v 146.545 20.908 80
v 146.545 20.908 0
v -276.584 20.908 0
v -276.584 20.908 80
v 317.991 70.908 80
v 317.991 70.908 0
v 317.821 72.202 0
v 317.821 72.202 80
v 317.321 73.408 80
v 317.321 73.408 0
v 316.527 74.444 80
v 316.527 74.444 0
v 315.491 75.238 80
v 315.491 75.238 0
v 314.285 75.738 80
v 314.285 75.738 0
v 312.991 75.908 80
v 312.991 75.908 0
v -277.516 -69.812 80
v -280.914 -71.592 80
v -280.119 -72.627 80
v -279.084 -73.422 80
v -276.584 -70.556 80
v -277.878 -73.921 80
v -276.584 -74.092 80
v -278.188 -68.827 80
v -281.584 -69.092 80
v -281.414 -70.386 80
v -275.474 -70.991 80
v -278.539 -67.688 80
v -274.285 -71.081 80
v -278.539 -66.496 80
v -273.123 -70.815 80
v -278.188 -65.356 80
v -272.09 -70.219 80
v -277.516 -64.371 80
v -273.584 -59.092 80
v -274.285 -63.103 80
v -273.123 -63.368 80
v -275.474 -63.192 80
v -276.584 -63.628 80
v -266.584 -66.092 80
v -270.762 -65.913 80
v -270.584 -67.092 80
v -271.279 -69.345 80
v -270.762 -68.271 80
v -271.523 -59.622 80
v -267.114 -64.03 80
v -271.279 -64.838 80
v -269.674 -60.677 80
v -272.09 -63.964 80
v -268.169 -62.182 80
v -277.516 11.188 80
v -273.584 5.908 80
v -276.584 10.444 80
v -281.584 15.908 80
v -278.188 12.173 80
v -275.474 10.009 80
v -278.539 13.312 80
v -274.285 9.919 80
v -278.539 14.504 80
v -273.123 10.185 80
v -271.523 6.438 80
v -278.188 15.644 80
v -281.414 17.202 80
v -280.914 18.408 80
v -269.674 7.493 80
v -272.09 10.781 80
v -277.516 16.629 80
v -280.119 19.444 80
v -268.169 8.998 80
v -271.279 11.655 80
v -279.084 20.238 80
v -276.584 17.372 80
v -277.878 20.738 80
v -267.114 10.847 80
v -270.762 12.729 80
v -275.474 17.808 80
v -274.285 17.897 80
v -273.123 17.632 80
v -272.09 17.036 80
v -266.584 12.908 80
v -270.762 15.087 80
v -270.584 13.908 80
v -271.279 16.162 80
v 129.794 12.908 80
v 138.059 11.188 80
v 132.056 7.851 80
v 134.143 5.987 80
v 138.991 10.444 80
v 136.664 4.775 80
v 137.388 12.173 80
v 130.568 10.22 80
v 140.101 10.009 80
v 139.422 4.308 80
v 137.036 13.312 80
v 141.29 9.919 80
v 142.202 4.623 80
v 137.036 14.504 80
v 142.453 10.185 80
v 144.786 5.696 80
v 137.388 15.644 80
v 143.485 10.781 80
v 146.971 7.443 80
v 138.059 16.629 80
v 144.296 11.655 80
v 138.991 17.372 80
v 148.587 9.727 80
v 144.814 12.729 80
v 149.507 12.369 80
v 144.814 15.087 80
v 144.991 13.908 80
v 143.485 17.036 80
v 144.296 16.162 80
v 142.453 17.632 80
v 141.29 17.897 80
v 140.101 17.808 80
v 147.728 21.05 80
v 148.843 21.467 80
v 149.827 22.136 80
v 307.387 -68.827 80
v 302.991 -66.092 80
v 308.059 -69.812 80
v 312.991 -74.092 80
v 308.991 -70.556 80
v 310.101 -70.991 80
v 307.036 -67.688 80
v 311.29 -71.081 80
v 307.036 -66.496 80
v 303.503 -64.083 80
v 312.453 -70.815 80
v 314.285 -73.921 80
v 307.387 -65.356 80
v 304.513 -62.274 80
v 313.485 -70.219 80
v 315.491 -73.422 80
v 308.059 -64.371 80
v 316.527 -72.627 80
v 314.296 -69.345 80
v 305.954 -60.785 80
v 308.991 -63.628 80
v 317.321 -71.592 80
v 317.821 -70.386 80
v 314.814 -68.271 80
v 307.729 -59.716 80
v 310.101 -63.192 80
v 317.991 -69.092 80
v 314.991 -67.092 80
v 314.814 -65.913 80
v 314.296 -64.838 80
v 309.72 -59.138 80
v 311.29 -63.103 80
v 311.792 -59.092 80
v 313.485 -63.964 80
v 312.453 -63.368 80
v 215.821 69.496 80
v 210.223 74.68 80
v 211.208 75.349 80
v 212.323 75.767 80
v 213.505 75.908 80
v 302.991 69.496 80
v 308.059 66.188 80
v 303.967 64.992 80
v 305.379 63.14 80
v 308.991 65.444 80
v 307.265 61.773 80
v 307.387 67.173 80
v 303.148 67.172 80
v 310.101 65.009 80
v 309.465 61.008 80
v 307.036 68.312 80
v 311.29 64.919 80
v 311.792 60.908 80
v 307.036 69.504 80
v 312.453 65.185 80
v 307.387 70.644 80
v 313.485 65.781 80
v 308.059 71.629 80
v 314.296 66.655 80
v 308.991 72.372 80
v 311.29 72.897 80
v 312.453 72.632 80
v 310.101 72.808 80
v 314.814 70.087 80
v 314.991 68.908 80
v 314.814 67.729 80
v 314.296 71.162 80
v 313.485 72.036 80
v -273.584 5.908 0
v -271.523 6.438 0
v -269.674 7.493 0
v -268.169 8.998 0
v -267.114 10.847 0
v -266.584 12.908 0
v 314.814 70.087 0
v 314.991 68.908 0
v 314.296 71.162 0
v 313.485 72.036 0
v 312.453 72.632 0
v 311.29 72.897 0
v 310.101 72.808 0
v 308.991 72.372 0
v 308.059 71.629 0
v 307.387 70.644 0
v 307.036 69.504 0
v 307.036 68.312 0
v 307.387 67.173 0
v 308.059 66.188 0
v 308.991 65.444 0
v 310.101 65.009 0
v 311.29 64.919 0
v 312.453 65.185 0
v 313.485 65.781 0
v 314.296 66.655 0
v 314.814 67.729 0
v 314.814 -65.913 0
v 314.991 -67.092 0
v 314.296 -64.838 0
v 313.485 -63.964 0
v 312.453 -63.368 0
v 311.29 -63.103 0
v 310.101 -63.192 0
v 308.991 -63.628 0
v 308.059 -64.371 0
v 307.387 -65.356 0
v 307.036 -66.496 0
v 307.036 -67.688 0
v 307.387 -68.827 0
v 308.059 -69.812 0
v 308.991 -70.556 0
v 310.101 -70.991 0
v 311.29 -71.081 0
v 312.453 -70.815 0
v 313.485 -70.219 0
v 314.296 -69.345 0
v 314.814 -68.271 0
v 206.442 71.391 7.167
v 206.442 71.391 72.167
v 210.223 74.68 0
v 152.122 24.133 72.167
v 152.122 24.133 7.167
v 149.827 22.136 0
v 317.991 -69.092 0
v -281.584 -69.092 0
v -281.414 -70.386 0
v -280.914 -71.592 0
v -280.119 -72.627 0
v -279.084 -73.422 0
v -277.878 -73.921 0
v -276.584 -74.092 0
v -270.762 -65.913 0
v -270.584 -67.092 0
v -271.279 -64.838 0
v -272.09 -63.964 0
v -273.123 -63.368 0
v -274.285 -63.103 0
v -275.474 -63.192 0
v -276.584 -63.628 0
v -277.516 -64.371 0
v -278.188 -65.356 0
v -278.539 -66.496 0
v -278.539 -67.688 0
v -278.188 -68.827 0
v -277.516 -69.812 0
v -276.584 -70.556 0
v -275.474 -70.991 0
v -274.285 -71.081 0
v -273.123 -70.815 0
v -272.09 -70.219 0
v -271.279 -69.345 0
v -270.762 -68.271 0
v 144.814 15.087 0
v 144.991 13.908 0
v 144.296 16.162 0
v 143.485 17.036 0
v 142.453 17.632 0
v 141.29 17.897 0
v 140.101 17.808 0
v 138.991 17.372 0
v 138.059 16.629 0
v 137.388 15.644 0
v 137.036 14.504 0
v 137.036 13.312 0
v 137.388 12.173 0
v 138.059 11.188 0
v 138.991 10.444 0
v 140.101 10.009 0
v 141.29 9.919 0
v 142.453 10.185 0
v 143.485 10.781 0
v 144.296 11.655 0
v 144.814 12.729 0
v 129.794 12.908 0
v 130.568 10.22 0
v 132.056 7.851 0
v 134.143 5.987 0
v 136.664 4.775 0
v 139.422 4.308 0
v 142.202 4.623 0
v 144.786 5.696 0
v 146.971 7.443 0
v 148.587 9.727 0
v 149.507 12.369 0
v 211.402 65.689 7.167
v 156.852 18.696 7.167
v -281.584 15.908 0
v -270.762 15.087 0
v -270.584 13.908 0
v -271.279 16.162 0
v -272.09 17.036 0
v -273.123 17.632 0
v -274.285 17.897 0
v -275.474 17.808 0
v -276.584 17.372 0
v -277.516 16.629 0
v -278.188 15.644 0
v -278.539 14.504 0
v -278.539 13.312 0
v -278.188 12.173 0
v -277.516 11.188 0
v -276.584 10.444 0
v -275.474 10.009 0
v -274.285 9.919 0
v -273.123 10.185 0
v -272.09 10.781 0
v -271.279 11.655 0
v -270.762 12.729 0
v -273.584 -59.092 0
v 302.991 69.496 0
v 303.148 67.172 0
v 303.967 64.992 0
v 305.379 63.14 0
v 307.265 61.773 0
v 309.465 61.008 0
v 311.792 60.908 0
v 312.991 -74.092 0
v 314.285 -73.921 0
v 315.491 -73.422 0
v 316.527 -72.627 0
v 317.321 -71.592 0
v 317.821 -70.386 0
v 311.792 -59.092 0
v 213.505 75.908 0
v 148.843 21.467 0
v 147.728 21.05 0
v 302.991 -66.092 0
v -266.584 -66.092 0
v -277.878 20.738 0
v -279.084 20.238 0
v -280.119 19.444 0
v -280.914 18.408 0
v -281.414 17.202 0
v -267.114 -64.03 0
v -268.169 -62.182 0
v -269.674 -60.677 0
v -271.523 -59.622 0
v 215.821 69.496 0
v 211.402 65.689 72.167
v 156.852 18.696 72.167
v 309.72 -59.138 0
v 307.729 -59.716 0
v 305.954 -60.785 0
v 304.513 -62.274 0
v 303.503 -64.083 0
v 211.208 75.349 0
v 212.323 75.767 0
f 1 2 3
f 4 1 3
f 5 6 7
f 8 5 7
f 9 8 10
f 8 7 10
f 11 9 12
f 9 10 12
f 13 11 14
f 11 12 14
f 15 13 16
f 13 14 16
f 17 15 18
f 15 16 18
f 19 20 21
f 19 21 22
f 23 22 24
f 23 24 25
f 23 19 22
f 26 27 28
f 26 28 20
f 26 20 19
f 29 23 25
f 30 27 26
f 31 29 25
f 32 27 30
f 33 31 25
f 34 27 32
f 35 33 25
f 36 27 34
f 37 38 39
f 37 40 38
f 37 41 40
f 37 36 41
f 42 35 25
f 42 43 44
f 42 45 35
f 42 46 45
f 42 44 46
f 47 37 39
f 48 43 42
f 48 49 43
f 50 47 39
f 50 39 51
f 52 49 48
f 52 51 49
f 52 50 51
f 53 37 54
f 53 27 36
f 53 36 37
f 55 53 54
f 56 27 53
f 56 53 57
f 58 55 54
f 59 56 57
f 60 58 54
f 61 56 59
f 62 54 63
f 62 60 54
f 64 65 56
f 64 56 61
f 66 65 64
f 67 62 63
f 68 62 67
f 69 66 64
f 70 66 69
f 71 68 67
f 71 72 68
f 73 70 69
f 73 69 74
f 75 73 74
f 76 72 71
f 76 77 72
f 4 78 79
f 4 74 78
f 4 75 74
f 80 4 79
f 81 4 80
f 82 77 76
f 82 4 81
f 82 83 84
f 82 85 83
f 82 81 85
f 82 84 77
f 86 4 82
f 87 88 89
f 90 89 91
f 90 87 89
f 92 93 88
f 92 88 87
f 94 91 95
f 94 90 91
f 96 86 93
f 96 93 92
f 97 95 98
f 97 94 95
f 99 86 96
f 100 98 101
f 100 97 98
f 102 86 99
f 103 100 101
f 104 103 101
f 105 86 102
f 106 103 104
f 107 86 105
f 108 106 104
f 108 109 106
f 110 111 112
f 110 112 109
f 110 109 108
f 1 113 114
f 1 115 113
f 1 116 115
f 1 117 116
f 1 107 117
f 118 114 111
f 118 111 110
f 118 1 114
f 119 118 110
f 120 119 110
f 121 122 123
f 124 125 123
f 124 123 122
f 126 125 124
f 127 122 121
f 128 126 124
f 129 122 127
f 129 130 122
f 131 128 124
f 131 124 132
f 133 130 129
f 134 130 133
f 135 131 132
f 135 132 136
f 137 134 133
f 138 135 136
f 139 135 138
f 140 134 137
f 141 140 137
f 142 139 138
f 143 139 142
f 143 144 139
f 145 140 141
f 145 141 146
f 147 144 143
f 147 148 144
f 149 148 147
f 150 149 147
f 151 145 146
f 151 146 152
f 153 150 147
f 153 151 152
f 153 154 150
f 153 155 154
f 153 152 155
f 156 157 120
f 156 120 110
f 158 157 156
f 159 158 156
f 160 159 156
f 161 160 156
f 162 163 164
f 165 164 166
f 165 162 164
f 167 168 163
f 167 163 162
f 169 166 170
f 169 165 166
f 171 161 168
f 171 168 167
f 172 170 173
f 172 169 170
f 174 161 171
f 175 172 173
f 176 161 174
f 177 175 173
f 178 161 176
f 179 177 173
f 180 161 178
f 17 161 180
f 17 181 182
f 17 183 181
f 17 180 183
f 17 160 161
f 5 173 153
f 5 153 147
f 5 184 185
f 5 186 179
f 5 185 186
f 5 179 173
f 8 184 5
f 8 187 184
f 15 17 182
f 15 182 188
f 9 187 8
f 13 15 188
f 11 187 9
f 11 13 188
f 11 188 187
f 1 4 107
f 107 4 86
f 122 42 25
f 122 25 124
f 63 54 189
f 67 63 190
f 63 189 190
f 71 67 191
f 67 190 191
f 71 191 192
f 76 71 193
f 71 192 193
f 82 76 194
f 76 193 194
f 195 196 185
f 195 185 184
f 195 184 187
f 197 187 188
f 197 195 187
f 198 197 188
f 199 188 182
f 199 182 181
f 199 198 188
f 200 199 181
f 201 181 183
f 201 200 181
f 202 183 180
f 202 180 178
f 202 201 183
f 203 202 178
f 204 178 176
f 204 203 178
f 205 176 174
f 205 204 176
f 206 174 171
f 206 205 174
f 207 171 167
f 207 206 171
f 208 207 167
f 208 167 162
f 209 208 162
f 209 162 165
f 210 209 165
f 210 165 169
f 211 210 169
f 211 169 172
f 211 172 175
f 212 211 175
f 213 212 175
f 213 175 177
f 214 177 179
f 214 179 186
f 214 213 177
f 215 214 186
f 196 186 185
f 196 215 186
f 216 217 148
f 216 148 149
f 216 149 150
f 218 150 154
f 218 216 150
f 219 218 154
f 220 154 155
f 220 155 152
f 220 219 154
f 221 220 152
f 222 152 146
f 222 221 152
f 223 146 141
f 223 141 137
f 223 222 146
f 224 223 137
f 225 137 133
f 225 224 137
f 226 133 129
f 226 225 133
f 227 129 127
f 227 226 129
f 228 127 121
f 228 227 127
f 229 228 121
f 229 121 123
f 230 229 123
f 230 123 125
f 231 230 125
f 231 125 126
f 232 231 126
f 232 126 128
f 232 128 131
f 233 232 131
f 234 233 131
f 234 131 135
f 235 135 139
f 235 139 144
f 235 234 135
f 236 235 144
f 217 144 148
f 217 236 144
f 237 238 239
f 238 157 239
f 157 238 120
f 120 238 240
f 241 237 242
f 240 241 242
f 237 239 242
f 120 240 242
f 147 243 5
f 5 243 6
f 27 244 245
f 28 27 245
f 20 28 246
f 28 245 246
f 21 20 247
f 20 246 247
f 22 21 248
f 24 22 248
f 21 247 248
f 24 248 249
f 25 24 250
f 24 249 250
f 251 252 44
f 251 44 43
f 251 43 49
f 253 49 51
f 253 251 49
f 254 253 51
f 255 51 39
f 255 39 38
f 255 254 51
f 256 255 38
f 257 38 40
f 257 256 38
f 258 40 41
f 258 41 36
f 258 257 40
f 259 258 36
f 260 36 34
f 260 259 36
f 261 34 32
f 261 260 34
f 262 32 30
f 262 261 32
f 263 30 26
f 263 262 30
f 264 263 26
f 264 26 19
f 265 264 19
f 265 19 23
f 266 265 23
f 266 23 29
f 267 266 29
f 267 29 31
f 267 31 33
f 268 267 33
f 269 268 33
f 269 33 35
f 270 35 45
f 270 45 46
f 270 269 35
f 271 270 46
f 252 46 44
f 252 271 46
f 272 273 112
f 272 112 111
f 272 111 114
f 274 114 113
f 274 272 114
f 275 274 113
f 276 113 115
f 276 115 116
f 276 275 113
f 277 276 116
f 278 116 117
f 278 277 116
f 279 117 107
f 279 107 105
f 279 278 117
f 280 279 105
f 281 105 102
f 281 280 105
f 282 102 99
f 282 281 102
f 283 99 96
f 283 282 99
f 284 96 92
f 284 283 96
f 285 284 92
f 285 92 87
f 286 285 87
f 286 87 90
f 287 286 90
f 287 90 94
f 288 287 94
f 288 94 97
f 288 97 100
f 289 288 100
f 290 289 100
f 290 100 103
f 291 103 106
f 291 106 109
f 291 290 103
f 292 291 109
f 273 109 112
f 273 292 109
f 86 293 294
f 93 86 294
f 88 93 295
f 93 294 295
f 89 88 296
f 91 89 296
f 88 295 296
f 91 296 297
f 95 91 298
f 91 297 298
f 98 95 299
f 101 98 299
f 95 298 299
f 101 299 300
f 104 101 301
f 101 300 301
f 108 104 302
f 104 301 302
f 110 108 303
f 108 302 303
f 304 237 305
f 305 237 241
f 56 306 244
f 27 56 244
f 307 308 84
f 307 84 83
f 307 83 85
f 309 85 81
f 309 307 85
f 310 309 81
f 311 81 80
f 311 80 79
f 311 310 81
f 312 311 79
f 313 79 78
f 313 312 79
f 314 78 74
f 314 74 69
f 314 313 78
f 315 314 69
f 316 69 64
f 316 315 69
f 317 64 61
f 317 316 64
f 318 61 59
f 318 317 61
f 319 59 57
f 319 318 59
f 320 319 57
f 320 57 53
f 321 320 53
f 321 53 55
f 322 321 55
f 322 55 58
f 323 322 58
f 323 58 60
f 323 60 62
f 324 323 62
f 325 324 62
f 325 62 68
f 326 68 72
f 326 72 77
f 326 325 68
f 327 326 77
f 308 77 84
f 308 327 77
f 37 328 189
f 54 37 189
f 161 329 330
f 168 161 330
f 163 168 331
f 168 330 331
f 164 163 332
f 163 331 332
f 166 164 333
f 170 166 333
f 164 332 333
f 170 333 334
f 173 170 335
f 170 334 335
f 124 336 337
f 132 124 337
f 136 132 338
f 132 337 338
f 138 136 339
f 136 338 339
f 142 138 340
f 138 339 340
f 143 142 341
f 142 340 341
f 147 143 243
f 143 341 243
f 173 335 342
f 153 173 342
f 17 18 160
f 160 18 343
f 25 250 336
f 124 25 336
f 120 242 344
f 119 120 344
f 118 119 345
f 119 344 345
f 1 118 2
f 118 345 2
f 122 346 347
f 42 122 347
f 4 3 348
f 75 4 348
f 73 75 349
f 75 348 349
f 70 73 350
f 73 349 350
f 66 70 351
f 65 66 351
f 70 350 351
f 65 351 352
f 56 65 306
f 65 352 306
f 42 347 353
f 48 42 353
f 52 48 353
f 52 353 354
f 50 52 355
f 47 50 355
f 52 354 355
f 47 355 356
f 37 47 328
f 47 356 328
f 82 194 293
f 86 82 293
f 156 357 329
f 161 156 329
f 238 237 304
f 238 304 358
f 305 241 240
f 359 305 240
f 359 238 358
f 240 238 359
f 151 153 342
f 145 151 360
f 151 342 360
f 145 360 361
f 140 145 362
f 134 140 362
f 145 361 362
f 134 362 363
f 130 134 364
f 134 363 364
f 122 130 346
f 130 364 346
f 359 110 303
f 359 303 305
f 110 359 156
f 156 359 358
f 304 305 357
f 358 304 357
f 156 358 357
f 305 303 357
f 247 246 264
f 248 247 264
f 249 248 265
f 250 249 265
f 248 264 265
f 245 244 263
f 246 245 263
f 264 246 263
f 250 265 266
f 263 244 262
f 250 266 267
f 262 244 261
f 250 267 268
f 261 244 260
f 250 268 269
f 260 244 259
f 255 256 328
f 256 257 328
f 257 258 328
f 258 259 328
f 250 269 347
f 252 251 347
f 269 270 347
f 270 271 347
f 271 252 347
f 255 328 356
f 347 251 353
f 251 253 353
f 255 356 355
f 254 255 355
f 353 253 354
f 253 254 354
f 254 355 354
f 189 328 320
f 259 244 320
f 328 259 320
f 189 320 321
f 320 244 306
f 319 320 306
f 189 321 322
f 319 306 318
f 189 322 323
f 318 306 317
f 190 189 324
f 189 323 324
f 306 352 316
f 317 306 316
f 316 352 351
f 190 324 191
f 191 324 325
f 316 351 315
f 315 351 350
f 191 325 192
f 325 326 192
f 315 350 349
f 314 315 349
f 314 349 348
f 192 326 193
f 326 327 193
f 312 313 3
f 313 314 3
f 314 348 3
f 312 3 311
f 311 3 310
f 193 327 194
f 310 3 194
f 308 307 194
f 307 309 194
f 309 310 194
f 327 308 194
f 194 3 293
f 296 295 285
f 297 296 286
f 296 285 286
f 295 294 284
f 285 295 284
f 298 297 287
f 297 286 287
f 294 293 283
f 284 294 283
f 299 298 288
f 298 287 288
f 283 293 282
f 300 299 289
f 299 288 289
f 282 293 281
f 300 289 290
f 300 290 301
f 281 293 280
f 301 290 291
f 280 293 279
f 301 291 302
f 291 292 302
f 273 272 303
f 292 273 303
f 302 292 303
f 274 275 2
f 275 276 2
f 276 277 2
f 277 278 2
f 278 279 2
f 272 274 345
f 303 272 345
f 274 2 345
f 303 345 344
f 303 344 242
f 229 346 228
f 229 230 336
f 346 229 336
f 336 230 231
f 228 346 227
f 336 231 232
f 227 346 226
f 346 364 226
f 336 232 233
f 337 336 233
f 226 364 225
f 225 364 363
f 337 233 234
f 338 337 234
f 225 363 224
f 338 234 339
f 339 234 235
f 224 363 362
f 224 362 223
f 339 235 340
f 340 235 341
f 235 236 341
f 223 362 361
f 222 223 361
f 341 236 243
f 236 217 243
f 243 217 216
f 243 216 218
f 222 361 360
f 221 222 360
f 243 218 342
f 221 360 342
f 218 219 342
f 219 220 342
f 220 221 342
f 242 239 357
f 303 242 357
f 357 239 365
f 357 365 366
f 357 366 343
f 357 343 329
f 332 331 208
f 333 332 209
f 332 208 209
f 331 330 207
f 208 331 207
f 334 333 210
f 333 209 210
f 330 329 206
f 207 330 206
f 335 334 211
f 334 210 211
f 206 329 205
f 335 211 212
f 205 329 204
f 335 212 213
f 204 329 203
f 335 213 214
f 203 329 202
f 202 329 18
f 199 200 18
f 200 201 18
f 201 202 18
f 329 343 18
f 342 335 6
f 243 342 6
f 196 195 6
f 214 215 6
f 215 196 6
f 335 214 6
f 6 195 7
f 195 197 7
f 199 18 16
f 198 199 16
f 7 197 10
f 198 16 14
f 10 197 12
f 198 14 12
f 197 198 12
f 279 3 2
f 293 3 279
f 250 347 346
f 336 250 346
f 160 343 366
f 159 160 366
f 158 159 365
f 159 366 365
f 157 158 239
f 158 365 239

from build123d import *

# Parameters (mm, degrees)
F0_R     = 4
F1_DEPTH = 80
F2_W     = 72
F2_H     = 65
F3_DEPTH = 7.5581648407


with BuildPart() as f1:
    # F0 (on Top) → F1 (new body)
    with BuildSketch(Plane.XY):
        with BuildLine():
            Line((312.9912793082, 75.9082514048), (213.5049590409, 75.9082514048))
            ThreePointArc((213.5049590409, 75.9082514048), (211.7529694182, 75.5912560345), (210.2231288352, 74.6804643496))
            Line((210.2231288352, 74.6804643496), (149.8273279867, 22.1360384599))
            ThreePointArc((149.8273279867, 22.1360384599), (148.2974874037, 21.225246775), (146.545497781, 20.9082514048))
            Line((146.545497781, 20.9082514048), (-276.5839193761, 20.9082514048))
            ThreePointArc((-276.5839193761, 20.9082514048), (-280.1194532821, 19.4437853107), (-281.5839193761, 15.9082514048))
            Line((-281.5839193761, 15.9082514048), (-281.5839193761, -69.0917485952))
            ThreePointArc((-281.5839193761, -69.0917485952), (-280.1194532821, -72.6272825012), (-276.5839193761, -74.0917485952))
            Line((-276.5839193761, -74.0917485952), (312.9912793082, -74.0917485952))
            ThreePointArc((312.9912793082, -74.0917485952), (316.5268132142, -72.6272825012), (317.9912793082, -69.0917485952))
            Line((317.9912793082, -69.0917485952), (317.9912793082, 70.9082514048))
            ThreePointArc((317.9912793082, 70.9082514048), (316.5268132142, 74.4437853107), (312.9912793082, 75.9082514048))
        make_face()
        with Locations((-274.5839193761, -67.0917485952)):
            Circle(F0_R, mode=Mode.SUBTRACT)
        with Locations((310.9912793082, -67.0917485952)):
            Circle(F0_R, mode=Mode.SUBTRACT)
        with Locations((-274.5839193761, 13.9082514048)):
            Circle(F0_R, mode=Mode.SUBTRACT)
        with BuildLine():
            Line((-273.5839193761, -59.0917485952), (-273.5839193761, 5.9082514048))
            ThreePointArc((-273.5839193761, 5.9082514048), (-268.8711623353, 8.1954943639), (-266.5839193761, 12.9082514048))
            Line((-266.5839193761, 12.9082514048), (-112.4131828547, 12.9082514048))
            Line((-112.4131828547, 12.9082514048), (129.7935396433, 12.9082514048))
            ThreePointArc((129.7935396433, 12.9082514048), (139.4221907616, 4.3077632055), (149.5066444733, 12.3689735962))
            Line((149.5066444733, 12.3689735962), (215.8209085464, 69.4959036966))
            Line((215.8209085464, 69.4959036966), (221.9247751874, 69.4959036966))
            Line((221.9247751874, 69.4959036966), (302.9912793082, 69.4959036966))
            ThreePointArc((302.9912793082, 69.4959036966), (305.379178673, 63.1399404445), (311.7916584015, 60.9082514048))
            Line((311.7916584015, 60.9082514048), (311.7916584015, -59.0917485952))
            ThreePointArc((311.7916584015, -59.0917485952), (305.9541464058, -60.7847511051), (302.9912793082, -66.0917485952))
            Line((302.9912793082, -66.0917485952), (-266.5839193761, -66.0917485952))
            ThreePointArc((-266.5839193761, -66.0917485952), (-268.8711623353, -61.3789915544), (-273.5839193761, -59.0917485952))
        make_face(mode=Mode.SUBTRACT)
        with Locations((140.9914862647, 13.9082514048)):
            Circle(F0_R, mode=Mode.SUBTRACT)
        with Locations((310.9912793082, 68.9082514048)):
            Circle(F0_R, mode=Mode.SUBTRACT)
    extrude(amount=F1_DEPTH)

    # F2 (on face) → F3 (cut, through all)
    with BuildSketch(Plane(origin=(53.5865112104, -61.5935982634, 0), x_dir=(-0.754442589, -0.6563660411, 0), z_dir=(-0.6563660411, 0.754442589, 0))):
        with Locations((-166.607229352, 39.6668340825)):
            Rectangle(F2_W, F2_H)
    extrude(amount=-F3_DEPTH, mode=Mode.SUBTRACT)


solid = f1.part
